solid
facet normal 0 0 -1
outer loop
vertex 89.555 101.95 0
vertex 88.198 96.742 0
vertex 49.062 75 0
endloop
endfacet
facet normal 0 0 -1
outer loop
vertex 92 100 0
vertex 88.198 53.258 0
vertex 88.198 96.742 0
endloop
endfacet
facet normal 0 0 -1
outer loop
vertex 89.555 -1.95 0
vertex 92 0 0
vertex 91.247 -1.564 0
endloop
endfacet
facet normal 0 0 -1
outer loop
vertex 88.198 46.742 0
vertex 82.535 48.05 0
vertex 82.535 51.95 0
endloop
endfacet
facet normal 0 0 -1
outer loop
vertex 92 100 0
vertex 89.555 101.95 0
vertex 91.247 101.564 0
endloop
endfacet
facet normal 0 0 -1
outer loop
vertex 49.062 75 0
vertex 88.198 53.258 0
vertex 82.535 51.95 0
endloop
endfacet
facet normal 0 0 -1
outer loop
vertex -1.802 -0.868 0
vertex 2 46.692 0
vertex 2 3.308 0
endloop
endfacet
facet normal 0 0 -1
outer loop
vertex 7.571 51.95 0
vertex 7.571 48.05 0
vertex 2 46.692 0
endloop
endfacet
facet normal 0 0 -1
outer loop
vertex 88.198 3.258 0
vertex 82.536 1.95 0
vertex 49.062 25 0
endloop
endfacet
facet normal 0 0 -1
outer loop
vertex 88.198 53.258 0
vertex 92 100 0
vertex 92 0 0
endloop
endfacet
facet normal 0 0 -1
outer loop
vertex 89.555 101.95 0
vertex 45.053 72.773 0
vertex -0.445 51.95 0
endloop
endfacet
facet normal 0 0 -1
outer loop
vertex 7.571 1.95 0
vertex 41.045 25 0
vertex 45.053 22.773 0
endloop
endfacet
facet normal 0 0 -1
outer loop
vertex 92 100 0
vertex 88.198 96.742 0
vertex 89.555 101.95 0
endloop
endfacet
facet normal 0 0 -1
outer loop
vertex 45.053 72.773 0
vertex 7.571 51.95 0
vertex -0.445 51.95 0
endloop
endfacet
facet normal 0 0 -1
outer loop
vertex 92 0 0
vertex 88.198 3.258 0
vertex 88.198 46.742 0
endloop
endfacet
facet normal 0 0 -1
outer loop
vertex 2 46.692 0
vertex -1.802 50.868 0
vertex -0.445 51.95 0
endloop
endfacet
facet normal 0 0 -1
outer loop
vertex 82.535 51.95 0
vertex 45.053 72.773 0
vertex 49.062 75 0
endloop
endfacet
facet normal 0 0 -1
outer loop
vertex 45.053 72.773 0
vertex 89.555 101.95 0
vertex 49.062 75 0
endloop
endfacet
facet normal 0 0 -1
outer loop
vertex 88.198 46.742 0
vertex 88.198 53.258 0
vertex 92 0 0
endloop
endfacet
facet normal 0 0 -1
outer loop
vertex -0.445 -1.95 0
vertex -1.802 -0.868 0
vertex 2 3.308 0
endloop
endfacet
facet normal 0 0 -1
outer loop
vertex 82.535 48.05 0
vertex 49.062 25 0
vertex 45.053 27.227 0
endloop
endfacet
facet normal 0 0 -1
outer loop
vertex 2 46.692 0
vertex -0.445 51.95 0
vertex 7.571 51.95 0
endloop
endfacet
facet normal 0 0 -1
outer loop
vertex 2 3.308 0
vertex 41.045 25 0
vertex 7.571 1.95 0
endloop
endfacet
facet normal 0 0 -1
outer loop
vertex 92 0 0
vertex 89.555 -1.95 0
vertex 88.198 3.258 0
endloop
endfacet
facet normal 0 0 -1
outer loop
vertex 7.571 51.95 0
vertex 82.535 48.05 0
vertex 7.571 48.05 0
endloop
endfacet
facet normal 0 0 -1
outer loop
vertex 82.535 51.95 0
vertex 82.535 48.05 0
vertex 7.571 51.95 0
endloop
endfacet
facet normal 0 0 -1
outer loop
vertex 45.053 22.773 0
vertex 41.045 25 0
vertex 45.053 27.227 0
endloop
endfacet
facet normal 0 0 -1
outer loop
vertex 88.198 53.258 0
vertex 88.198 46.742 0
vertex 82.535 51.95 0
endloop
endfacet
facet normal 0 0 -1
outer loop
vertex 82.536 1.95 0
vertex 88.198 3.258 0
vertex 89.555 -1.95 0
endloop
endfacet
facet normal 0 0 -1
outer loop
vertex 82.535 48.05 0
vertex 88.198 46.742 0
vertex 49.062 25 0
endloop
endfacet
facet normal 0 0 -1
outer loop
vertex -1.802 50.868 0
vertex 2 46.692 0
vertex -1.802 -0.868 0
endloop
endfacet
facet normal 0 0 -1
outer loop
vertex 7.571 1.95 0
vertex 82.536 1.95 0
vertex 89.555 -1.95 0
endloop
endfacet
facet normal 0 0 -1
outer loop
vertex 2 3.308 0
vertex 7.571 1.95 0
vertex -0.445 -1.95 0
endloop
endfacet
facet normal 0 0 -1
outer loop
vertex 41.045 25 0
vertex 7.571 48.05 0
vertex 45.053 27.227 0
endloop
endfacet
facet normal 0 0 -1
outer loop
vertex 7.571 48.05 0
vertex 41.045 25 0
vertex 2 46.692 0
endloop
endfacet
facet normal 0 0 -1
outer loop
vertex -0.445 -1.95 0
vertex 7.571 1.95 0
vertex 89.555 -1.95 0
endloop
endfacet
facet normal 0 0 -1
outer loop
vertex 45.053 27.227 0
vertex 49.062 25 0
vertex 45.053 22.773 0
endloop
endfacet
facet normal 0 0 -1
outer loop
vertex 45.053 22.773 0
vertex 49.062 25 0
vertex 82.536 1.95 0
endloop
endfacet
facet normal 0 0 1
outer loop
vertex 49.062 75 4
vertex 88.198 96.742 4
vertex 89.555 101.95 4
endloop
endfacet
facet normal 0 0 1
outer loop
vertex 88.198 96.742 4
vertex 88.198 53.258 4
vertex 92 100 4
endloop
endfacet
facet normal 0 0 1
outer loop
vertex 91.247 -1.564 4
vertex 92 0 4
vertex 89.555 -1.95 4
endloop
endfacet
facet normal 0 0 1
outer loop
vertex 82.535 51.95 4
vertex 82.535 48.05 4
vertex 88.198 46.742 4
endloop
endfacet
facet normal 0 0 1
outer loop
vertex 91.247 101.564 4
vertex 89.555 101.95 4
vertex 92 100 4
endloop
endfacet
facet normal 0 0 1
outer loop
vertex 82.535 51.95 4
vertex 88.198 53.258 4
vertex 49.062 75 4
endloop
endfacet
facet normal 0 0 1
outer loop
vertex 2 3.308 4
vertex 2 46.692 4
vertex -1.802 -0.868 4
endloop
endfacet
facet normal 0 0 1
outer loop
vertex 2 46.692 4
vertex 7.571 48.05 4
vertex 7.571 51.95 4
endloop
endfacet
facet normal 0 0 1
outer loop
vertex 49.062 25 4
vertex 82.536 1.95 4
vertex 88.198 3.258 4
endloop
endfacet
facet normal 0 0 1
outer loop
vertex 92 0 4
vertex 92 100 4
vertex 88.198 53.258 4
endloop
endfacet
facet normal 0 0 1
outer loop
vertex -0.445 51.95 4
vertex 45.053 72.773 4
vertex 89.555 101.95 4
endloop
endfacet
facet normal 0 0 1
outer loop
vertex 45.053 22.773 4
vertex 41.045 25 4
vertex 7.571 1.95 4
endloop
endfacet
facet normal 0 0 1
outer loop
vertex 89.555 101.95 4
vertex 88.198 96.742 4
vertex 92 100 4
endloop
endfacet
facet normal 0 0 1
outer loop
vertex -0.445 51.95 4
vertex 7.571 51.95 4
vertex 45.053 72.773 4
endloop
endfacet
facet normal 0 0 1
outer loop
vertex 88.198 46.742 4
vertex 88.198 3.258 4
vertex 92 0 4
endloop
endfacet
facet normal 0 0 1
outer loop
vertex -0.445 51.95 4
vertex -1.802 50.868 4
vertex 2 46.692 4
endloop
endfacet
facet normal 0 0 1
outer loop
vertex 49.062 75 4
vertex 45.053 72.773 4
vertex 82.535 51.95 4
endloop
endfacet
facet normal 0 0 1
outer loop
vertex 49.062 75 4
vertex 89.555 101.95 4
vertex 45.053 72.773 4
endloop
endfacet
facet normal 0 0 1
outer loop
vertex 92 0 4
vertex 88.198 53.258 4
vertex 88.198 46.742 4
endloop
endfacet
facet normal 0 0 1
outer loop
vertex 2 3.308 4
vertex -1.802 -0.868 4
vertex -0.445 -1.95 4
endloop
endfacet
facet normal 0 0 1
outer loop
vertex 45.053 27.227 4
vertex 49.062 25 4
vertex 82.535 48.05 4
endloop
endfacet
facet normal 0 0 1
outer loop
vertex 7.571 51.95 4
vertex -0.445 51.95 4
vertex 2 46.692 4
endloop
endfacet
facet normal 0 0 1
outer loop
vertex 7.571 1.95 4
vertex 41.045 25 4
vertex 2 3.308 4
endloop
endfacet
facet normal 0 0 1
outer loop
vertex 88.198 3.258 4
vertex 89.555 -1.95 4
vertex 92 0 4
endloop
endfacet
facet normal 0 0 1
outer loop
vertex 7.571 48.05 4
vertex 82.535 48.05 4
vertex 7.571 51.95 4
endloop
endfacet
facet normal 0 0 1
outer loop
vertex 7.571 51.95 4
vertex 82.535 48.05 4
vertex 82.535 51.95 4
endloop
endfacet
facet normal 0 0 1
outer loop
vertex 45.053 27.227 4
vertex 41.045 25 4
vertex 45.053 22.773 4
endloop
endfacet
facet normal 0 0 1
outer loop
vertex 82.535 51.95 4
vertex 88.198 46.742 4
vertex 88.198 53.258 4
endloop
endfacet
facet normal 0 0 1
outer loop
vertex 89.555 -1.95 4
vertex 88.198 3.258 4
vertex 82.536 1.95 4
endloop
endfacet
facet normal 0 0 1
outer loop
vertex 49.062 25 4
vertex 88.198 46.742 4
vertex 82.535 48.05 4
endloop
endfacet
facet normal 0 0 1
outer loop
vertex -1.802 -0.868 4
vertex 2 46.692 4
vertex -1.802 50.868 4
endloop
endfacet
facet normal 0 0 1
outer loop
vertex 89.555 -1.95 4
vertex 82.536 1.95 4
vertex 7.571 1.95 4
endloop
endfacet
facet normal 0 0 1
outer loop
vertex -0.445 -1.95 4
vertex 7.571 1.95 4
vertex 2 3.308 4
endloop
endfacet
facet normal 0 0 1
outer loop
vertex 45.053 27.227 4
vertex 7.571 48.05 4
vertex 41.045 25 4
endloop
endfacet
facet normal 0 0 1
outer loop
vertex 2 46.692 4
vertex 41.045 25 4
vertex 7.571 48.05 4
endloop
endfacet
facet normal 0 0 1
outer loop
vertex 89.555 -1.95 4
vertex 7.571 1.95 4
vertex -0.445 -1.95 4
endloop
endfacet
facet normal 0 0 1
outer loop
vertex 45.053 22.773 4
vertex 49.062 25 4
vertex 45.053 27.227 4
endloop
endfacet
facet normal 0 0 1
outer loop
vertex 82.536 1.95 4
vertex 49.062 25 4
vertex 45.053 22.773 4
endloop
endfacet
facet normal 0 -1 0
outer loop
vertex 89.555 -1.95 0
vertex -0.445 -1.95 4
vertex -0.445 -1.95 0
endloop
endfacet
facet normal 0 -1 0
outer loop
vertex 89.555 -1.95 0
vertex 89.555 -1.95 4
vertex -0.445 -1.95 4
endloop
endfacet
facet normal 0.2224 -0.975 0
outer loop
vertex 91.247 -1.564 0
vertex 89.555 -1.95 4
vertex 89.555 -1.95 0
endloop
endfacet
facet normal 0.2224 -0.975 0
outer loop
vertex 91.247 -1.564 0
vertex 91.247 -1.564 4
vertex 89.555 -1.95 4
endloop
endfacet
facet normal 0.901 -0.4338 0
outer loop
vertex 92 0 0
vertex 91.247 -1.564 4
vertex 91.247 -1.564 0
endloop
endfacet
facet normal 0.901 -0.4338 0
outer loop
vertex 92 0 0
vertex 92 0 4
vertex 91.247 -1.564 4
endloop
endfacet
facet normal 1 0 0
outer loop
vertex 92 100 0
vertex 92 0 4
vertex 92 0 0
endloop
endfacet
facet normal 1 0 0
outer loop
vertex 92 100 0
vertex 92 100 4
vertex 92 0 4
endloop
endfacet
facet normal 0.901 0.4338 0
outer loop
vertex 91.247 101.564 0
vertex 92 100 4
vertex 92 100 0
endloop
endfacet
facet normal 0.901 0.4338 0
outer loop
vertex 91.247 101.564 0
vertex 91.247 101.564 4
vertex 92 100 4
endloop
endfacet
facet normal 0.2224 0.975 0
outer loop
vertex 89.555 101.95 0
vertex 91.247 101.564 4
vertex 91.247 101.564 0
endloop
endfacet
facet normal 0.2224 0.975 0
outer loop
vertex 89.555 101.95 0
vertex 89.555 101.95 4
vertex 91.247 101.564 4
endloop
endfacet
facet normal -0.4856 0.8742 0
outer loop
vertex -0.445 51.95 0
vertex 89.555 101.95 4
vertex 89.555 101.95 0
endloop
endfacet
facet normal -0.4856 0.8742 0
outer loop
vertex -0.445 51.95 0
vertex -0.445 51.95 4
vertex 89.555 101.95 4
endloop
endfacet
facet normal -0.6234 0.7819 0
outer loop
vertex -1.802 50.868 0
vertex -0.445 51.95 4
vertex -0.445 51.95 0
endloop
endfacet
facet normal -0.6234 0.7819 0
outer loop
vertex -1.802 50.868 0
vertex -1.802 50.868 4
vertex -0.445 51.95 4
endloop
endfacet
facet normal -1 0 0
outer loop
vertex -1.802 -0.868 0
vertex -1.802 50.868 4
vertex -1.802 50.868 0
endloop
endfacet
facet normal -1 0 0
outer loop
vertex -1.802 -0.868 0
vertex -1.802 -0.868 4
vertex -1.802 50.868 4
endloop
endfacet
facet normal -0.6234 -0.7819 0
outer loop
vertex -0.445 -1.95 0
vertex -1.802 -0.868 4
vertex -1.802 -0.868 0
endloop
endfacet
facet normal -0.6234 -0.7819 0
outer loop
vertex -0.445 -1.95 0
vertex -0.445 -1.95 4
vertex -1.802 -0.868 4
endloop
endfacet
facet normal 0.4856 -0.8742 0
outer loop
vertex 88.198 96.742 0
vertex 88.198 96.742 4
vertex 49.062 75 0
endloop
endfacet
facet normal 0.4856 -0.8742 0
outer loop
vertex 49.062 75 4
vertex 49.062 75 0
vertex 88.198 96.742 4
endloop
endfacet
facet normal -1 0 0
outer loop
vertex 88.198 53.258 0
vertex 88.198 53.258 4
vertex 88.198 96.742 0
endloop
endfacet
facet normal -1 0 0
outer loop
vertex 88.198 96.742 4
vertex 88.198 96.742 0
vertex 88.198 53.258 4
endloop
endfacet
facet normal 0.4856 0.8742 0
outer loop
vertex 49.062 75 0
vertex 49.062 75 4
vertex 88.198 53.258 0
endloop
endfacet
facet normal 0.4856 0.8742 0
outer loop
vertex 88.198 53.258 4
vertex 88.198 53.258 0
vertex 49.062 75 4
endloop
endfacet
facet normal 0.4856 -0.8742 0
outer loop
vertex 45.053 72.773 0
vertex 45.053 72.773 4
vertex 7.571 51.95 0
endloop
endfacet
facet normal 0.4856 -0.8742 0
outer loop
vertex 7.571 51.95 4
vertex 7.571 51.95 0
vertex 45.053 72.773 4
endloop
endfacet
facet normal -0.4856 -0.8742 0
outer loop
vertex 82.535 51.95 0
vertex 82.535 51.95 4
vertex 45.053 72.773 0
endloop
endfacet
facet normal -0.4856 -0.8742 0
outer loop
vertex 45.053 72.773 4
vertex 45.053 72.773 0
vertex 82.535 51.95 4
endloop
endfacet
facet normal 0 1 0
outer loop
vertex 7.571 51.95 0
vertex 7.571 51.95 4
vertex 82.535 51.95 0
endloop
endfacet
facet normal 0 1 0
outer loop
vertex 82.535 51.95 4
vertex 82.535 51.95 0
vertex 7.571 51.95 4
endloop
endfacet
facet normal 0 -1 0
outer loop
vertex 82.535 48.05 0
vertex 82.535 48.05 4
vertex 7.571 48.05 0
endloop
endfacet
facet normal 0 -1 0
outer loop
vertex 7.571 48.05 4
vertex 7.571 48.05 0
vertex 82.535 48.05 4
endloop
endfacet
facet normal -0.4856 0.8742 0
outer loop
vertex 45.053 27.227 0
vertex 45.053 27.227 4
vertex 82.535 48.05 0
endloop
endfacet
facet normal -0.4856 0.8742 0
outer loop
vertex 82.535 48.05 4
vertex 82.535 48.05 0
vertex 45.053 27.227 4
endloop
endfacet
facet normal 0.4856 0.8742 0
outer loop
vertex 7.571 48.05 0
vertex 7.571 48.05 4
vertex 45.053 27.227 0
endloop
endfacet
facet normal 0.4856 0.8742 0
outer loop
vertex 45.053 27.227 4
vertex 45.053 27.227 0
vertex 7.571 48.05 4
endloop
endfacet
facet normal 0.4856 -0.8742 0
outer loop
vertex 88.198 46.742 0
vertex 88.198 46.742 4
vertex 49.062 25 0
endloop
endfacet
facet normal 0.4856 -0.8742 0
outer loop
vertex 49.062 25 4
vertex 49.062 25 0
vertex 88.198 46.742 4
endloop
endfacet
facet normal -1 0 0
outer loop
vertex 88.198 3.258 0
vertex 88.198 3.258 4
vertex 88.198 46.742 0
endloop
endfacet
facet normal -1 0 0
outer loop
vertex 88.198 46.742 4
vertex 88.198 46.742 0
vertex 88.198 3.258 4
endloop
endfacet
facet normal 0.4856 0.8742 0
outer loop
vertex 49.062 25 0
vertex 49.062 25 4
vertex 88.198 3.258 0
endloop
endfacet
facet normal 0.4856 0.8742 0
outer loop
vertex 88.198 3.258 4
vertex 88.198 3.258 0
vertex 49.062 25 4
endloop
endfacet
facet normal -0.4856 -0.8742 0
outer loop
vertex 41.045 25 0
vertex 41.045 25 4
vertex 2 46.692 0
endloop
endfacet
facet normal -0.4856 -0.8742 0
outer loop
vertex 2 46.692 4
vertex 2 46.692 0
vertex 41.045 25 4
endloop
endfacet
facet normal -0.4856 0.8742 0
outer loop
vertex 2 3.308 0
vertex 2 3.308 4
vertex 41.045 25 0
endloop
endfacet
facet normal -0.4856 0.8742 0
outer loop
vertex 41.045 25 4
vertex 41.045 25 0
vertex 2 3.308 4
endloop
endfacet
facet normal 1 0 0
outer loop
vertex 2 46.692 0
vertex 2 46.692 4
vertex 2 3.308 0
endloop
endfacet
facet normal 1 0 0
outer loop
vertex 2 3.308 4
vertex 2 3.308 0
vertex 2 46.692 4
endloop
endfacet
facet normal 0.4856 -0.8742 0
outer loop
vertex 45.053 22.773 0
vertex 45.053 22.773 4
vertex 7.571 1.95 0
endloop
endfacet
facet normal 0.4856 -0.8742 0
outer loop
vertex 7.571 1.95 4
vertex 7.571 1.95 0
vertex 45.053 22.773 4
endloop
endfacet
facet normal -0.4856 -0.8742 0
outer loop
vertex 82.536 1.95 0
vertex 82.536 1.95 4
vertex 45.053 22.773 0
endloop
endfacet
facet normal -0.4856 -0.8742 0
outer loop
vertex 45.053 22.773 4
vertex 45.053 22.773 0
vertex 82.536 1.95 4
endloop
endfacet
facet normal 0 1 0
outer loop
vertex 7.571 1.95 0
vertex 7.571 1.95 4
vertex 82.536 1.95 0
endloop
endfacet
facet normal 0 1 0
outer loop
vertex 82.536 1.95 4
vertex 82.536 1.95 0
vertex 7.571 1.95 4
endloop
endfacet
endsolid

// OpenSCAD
// Copyright 2013 Peter Withers
// Licensed as GPL 2

module empennageCard(height, span, chord, elevatorChord){
    translate([-chord,0,0]){
        cube([chord,span,1]);
	cube([chord,1,height]);
	translate([0,-span,0])cube([chord,span,1]);
	elevator(height, span, chord,elevatorChord);
    }
}

module empennageStruts(height, span, chord, elevatorChord){
    echo(str("empennageStruts(",height,",",span,",",chord,",",elevatorChord,");"));
    // because we are making a triangles while we calculated the area as a square we will increase the height and chord each by sqrt(2)
    heightCorrected=height*1.41;
    spanCorrected=span*1.41;
    chordCorrected=chord*1.41;
    translate([-chordCorrected,0,0]){
	horizontalStabiliser(heightCorrected, spanCorrected, chordCorrected);
	verticalStabiliser(heightCorrected, spanCorrected, chordCorrected);
	scale([1,-1,1])translate([0,0,0])horizontalStabiliser(heightCorrected, spanCorrected, chordCorrected);
	elevator(height, span, chordCorrected,elevatorChord);
    }
}

module verticalStabiliser(height, span, chord){
	echo(str("verticalStabiliser(",height,",",span,",",chord,");"));
	rotate([90,0,0]) hull() {
		translate([chord-10,height-10,0]) circle(10);
		translate([1,1,0])circle(1, center=true);
		translate([chord-1,1,0])circle(1, center=true);
 	}
}

module singleStrut(startX, startY, endX, endY){
    hull() {
        translate([startX,startY,0]) circle(2);
        translate([endX,endY,0]) circle(2);
    }
}

module horizontalStabiliser(height, span, chord){
	echo(str("horizontalStabiliser(",height,",",span,",",chord,");"));
        linear_extrude(height=4){
            // make the outer shape
            singleStrut(0, 0, chord, 0);
            singleStrut(0, 0, 0, span/2);
            singleStrut(0, span/2, chord, span);
            singleStrut(chord, span, chord, 0);
            // make the inner triangles
            singleStrut(0, span/2, chord, 0);
            singleStrut(chord, span/2, 0, 0);
            singleStrut(chord, span/2, 0, span/2);
            singleStrut(chord, span/2, chord/2, span*0.75);
            /*%hull(){
            translate([chord-10,span-10,0]) circle(10);
            translate([1,1,0])circle(1, center=true);
            translate([chord-1,1,10])circle(1, center=true);
            }*/
        }
}

module elevator(height, span, chord, elevatorChord){
	echo(str("elevator(",height,",",span,",",chord,",",elevatorChord,");"));
	translate([chord+1,10-span,0]) cube([elevatorChord,span*2-20,1]);
}

horizontalStabiliser(100,100,90);
//ECHO: "verticalStabiliser(112.8,169.2,112.8);"
//ECHO: "horizontalStabiliser(112.8,169.2,112.8);"
//ECHO: "elevator(80,120,112.8,20);"
//empennageStruts(80,120,80,20);
//empennageCard(20, 30, 25, 10);
//empennageStruts(20, 30, 25, 10);
//empennageStruts(40, 80, 50, 10);
